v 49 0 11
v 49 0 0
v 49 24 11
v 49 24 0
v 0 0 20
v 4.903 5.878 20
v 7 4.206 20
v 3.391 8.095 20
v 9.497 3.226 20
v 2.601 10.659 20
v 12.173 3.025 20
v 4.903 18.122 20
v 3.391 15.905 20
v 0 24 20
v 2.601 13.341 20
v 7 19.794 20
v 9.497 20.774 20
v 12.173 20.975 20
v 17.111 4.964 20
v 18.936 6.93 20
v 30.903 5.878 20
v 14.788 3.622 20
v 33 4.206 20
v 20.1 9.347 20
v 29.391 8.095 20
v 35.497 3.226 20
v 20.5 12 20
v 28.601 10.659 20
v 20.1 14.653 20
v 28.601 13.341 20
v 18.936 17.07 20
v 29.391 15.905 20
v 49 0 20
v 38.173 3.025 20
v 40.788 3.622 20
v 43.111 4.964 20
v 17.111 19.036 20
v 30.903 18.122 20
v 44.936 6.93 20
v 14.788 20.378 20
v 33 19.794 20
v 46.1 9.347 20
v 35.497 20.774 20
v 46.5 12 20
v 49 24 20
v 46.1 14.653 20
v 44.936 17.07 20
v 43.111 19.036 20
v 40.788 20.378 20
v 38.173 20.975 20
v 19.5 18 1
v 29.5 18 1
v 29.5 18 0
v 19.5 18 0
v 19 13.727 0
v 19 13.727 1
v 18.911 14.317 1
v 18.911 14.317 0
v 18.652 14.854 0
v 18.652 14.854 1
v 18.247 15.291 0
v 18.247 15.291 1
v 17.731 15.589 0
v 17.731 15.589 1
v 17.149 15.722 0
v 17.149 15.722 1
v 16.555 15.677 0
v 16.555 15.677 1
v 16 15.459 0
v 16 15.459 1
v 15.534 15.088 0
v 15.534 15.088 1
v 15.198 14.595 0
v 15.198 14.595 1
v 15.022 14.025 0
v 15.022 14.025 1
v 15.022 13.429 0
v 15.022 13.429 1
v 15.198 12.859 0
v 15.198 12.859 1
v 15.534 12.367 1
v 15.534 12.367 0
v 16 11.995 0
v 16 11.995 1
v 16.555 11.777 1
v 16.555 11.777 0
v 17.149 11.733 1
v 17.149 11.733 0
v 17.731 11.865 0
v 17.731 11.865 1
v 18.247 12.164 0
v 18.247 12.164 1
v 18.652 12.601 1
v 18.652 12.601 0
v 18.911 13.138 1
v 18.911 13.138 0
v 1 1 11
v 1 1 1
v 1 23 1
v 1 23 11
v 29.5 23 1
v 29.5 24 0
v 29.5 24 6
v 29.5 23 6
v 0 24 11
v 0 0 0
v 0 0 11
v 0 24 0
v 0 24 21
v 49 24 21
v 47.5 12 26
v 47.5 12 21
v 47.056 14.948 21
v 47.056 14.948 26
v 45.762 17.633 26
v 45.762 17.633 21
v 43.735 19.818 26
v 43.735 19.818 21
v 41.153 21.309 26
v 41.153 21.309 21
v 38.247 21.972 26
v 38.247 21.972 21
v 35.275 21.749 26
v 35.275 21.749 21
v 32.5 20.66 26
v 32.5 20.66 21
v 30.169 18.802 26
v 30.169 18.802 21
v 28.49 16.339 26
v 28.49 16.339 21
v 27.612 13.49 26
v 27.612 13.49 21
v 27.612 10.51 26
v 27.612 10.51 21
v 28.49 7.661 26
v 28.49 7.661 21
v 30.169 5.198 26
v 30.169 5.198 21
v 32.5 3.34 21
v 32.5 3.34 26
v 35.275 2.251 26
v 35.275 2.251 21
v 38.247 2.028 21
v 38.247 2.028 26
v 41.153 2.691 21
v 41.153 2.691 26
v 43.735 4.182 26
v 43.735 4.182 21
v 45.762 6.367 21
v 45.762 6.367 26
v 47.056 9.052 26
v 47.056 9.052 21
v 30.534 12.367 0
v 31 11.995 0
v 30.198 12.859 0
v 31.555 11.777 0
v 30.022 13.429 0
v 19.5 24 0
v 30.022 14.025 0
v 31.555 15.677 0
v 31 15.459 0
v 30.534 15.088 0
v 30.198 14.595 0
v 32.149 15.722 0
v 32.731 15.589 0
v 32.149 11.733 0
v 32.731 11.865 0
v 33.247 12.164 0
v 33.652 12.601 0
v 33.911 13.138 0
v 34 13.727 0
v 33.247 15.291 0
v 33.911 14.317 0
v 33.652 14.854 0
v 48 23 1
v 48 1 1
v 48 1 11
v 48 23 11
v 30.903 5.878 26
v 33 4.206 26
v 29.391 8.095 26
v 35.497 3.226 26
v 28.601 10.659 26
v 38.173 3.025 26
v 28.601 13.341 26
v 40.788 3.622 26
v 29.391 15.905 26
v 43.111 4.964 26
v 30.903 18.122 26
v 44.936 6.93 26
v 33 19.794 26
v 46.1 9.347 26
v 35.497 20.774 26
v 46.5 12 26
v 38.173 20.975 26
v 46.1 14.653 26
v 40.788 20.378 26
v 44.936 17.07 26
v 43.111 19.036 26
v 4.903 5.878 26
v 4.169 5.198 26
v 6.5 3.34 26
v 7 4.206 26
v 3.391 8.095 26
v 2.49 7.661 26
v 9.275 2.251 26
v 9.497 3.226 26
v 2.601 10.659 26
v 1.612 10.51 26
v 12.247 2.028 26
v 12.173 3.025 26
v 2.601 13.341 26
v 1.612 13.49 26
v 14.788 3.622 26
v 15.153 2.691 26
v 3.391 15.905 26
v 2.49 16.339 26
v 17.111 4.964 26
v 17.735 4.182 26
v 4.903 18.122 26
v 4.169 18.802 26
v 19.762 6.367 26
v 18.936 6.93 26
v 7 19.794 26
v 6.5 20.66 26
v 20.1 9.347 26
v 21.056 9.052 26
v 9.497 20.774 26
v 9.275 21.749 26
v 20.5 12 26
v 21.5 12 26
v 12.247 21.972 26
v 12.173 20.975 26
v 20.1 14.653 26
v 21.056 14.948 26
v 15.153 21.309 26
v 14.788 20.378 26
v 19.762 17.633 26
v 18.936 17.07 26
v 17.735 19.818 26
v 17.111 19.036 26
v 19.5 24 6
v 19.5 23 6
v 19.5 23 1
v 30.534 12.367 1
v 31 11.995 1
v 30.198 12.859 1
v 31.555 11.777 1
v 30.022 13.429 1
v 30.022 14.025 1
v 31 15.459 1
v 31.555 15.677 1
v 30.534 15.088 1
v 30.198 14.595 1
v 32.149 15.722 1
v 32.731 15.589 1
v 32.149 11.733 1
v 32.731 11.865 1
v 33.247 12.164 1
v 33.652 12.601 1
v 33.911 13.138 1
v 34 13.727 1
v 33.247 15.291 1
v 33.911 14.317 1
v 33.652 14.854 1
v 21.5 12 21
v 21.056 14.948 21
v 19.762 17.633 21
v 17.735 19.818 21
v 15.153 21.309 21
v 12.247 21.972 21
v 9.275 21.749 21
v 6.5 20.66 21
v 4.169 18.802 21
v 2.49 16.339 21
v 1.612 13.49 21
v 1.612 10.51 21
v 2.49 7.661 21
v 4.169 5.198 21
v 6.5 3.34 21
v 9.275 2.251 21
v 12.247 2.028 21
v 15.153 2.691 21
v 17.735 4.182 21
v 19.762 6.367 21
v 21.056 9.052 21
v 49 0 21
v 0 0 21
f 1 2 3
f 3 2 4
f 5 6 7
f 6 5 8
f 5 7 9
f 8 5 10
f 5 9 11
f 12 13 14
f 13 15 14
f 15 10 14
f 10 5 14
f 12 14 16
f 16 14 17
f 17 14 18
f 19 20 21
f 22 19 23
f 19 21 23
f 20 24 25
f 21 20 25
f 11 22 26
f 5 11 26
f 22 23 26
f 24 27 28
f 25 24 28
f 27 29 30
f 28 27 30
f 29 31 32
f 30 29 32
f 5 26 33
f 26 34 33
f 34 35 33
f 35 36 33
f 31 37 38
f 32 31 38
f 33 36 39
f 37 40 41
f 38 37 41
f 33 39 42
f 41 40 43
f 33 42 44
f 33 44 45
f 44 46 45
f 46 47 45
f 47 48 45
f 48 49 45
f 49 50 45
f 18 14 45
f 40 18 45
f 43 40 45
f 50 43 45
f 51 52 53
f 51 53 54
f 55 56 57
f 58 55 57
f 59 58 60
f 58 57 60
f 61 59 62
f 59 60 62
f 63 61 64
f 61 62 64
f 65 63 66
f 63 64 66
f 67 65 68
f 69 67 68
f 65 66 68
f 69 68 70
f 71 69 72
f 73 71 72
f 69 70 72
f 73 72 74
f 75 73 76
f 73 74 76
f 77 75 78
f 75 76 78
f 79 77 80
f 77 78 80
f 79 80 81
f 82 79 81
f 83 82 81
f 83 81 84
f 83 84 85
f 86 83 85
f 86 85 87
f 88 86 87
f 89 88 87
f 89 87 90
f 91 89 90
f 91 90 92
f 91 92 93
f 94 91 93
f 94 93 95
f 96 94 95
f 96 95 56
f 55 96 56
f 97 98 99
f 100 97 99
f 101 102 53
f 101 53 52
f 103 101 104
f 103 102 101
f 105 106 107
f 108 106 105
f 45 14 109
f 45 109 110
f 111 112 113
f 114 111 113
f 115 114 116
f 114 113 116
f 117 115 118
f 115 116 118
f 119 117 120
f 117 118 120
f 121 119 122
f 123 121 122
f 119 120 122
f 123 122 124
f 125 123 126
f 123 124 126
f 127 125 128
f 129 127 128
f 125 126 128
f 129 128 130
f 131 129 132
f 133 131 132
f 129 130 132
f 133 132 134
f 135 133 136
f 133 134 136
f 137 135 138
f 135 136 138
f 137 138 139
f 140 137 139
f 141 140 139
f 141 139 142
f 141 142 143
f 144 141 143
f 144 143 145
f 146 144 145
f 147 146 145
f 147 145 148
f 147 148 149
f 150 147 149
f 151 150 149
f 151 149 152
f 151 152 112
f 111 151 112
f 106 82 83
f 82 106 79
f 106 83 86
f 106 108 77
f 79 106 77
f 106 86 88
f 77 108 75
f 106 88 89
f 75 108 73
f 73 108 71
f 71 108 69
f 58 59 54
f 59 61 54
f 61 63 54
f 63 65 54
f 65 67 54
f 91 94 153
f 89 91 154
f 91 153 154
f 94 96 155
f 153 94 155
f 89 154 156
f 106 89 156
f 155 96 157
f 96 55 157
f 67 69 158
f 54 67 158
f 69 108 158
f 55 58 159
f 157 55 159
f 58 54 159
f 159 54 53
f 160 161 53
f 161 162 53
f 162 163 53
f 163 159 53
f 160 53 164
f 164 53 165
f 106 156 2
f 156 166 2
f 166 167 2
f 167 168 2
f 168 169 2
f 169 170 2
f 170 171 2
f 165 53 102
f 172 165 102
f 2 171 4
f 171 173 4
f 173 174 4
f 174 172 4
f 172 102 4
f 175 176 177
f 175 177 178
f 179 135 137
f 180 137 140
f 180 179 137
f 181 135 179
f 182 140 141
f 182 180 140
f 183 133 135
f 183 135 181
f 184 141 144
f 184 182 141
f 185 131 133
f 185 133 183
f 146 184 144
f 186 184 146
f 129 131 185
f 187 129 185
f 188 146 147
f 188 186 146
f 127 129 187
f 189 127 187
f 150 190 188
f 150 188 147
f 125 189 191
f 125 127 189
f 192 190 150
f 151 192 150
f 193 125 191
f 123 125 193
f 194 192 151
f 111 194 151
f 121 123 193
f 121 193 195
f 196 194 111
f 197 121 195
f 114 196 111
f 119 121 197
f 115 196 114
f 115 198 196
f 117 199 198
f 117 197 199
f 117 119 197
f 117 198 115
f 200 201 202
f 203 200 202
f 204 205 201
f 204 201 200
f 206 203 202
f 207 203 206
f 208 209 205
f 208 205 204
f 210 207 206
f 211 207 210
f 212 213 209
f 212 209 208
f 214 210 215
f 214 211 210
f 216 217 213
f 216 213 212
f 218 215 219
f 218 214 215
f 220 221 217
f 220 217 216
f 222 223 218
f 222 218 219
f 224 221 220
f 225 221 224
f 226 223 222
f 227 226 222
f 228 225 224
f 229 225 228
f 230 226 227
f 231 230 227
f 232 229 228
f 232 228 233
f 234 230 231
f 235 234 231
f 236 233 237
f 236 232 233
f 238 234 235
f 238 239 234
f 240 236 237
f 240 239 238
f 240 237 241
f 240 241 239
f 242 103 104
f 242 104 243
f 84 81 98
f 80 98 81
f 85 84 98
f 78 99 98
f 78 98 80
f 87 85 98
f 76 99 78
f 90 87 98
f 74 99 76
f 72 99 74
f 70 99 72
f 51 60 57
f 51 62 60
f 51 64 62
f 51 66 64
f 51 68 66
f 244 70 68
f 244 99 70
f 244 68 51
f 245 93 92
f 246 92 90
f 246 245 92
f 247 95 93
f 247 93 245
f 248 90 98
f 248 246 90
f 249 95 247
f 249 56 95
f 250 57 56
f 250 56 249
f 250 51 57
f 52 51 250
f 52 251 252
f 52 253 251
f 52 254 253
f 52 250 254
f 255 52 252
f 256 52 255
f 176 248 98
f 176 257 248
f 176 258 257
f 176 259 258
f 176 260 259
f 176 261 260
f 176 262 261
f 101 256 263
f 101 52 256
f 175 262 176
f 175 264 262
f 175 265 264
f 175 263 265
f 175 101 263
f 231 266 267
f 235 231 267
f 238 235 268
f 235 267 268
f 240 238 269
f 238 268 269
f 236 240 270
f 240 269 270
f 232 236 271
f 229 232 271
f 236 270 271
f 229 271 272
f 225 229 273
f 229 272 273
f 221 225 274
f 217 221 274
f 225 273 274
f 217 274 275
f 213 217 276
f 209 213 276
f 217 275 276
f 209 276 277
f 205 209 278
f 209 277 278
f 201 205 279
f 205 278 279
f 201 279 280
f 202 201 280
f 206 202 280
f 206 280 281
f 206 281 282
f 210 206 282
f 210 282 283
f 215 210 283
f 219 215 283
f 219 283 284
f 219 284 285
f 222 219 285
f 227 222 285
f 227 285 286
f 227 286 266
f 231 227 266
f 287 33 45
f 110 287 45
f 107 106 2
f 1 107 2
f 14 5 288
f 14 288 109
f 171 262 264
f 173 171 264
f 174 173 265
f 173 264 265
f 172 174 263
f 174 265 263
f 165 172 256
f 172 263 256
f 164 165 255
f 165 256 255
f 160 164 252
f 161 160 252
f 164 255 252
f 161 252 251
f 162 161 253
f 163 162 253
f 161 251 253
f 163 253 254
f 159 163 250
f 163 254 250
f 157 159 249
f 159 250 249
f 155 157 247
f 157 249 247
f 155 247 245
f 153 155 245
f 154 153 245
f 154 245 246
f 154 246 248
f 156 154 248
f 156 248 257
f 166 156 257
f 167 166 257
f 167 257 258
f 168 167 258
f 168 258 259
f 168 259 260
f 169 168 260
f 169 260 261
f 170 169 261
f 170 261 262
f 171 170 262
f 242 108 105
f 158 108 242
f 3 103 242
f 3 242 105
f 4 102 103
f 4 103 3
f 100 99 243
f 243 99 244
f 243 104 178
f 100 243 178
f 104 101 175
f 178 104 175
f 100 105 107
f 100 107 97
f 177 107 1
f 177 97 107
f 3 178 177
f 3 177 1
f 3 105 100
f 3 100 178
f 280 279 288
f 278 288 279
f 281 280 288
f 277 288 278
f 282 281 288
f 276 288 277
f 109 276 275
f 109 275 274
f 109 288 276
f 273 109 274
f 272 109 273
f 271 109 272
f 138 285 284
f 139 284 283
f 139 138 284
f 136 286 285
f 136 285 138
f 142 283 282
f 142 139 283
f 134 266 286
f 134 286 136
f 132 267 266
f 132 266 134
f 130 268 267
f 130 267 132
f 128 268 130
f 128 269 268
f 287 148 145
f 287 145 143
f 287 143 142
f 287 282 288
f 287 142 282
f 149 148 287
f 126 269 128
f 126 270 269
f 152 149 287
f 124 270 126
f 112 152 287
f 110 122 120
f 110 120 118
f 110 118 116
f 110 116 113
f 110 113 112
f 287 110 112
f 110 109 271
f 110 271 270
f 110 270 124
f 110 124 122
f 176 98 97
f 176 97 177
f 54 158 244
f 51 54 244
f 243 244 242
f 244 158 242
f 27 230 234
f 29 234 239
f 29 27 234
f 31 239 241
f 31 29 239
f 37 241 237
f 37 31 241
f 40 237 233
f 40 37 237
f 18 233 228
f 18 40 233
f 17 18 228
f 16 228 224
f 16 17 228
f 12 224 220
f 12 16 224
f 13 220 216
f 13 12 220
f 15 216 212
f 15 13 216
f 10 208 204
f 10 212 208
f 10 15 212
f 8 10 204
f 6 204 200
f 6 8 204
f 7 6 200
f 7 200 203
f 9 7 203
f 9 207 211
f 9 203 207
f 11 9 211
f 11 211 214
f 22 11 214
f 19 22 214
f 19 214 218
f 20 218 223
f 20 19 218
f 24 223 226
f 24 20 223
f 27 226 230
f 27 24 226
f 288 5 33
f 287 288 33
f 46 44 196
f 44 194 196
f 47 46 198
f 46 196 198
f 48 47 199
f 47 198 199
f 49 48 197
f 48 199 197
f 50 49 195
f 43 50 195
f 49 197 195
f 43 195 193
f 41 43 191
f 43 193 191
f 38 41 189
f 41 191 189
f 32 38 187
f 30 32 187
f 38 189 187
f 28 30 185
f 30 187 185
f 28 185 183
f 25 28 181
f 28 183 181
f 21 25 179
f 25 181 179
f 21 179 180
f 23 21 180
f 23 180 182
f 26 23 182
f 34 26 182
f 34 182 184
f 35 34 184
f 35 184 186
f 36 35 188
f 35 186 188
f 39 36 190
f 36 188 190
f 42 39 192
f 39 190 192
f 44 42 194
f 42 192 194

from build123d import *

# Parameters (mm, degrees)
SKETCH_W        = 49
SKETCH_H        = 24
PAD_DEPTH       = 1
SKETCH001_R     = 10
PAD001_DEPTH    = 6
SKETCH002_R     = 9
POCKET_DEPTH    = 10
SKETCH003_W     = 49
SKETCH003_H     = 24
PAD002_DEPTH    = 1
SKETCH004_W     = 49
SKETCH004_H     = 24
SKETCH004_W_2   = 47
SKETCH004_H_2   = 22
PAD003_DEPTH    = 11
SKETCH005_W     = 10
SKETCH005_H     = 10
POCKET001_DEPTH = 6
SKETCH006_R     = 2
POCKET002_DEPTH = 5


with BuildPart() as front:
    # Sketch → Pad (new body)
    with BuildSketch(Plane.XY.offset(20)):
        with Locations((24.5, 12)):
            Rectangle(SKETCH_W, SKETCH_H)
    extrude(amount=PAD_DEPTH)

    # Sketch001 → Pad001 (join)
    with BuildSketch(Plane.XY.offset(20)):
        with Locations((11.5, 12)):
            Circle(SKETCH001_R)
        with Locations((37.5, 12)):
            Circle(SKETCH001_R)
    extrude(amount=PAD001_DEPTH)

    # Sketch002 → Pocket (cut, symmetric)
    with BuildSketch(Plane.XY.offset(20)):
        with Locations((11.5, 12)):
            Circle(SKETCH002_R)
        with Locations((37.5, 12)):
            Circle(SKETCH002_R)
    extrude(amount=POCKET_DEPTH, both=True, mode=Mode.SUBTRACT)


with BuildPart() as rear:
    # Sketch003 → Pad002 (new body)
    with BuildSketch(Plane.XY):
        with Locations((24.5, 12)):
            Rectangle(SKETCH003_W, SKETCH003_H)
    extrude(amount=PAD002_DEPTH)

    # Sketch004 → Pad003 (join)
    with BuildSketch(Plane.XY):
        with Locations((24.5, 12)):
            Rectangle(SKETCH004_W, SKETCH004_H)
        with Locations((24.5, 12)):
            Rectangle(SKETCH004_W_2, SKETCH004_H_2, mode=Mode.SUBTRACT)
    extrude(amount=PAD003_DEPTH)

    # Sketch005 (on Face5 of Pad003) → Pocket001 (cut)
    with BuildSketch(Plane(origin=(0, 24, 0), x_dir=(-1, 0, 0), z_dir=(0, 1, 0))):
        with Locations((-24.5, 1)):
            Rectangle(SKETCH005_W, SKETCH005_H)
    extrude(amount=-POCKET001_DEPTH, mode=Mode.SUBTRACT)

    # Sketch006 (on Face12 of Pocket001) → Pocket002 (cut)
    with BuildSketch(Plane.XY.offset(1)):
        with Locations((17, 13.727225)):
            Circle(SKETCH006_R)
        with Locations((32, 13.727225)):
            Circle(SKETCH006_R)
    extrude(amount=-POCKET002_DEPTH, mode=Mode.SUBTRACT)


solid = Compound([front.part, rear.part])
